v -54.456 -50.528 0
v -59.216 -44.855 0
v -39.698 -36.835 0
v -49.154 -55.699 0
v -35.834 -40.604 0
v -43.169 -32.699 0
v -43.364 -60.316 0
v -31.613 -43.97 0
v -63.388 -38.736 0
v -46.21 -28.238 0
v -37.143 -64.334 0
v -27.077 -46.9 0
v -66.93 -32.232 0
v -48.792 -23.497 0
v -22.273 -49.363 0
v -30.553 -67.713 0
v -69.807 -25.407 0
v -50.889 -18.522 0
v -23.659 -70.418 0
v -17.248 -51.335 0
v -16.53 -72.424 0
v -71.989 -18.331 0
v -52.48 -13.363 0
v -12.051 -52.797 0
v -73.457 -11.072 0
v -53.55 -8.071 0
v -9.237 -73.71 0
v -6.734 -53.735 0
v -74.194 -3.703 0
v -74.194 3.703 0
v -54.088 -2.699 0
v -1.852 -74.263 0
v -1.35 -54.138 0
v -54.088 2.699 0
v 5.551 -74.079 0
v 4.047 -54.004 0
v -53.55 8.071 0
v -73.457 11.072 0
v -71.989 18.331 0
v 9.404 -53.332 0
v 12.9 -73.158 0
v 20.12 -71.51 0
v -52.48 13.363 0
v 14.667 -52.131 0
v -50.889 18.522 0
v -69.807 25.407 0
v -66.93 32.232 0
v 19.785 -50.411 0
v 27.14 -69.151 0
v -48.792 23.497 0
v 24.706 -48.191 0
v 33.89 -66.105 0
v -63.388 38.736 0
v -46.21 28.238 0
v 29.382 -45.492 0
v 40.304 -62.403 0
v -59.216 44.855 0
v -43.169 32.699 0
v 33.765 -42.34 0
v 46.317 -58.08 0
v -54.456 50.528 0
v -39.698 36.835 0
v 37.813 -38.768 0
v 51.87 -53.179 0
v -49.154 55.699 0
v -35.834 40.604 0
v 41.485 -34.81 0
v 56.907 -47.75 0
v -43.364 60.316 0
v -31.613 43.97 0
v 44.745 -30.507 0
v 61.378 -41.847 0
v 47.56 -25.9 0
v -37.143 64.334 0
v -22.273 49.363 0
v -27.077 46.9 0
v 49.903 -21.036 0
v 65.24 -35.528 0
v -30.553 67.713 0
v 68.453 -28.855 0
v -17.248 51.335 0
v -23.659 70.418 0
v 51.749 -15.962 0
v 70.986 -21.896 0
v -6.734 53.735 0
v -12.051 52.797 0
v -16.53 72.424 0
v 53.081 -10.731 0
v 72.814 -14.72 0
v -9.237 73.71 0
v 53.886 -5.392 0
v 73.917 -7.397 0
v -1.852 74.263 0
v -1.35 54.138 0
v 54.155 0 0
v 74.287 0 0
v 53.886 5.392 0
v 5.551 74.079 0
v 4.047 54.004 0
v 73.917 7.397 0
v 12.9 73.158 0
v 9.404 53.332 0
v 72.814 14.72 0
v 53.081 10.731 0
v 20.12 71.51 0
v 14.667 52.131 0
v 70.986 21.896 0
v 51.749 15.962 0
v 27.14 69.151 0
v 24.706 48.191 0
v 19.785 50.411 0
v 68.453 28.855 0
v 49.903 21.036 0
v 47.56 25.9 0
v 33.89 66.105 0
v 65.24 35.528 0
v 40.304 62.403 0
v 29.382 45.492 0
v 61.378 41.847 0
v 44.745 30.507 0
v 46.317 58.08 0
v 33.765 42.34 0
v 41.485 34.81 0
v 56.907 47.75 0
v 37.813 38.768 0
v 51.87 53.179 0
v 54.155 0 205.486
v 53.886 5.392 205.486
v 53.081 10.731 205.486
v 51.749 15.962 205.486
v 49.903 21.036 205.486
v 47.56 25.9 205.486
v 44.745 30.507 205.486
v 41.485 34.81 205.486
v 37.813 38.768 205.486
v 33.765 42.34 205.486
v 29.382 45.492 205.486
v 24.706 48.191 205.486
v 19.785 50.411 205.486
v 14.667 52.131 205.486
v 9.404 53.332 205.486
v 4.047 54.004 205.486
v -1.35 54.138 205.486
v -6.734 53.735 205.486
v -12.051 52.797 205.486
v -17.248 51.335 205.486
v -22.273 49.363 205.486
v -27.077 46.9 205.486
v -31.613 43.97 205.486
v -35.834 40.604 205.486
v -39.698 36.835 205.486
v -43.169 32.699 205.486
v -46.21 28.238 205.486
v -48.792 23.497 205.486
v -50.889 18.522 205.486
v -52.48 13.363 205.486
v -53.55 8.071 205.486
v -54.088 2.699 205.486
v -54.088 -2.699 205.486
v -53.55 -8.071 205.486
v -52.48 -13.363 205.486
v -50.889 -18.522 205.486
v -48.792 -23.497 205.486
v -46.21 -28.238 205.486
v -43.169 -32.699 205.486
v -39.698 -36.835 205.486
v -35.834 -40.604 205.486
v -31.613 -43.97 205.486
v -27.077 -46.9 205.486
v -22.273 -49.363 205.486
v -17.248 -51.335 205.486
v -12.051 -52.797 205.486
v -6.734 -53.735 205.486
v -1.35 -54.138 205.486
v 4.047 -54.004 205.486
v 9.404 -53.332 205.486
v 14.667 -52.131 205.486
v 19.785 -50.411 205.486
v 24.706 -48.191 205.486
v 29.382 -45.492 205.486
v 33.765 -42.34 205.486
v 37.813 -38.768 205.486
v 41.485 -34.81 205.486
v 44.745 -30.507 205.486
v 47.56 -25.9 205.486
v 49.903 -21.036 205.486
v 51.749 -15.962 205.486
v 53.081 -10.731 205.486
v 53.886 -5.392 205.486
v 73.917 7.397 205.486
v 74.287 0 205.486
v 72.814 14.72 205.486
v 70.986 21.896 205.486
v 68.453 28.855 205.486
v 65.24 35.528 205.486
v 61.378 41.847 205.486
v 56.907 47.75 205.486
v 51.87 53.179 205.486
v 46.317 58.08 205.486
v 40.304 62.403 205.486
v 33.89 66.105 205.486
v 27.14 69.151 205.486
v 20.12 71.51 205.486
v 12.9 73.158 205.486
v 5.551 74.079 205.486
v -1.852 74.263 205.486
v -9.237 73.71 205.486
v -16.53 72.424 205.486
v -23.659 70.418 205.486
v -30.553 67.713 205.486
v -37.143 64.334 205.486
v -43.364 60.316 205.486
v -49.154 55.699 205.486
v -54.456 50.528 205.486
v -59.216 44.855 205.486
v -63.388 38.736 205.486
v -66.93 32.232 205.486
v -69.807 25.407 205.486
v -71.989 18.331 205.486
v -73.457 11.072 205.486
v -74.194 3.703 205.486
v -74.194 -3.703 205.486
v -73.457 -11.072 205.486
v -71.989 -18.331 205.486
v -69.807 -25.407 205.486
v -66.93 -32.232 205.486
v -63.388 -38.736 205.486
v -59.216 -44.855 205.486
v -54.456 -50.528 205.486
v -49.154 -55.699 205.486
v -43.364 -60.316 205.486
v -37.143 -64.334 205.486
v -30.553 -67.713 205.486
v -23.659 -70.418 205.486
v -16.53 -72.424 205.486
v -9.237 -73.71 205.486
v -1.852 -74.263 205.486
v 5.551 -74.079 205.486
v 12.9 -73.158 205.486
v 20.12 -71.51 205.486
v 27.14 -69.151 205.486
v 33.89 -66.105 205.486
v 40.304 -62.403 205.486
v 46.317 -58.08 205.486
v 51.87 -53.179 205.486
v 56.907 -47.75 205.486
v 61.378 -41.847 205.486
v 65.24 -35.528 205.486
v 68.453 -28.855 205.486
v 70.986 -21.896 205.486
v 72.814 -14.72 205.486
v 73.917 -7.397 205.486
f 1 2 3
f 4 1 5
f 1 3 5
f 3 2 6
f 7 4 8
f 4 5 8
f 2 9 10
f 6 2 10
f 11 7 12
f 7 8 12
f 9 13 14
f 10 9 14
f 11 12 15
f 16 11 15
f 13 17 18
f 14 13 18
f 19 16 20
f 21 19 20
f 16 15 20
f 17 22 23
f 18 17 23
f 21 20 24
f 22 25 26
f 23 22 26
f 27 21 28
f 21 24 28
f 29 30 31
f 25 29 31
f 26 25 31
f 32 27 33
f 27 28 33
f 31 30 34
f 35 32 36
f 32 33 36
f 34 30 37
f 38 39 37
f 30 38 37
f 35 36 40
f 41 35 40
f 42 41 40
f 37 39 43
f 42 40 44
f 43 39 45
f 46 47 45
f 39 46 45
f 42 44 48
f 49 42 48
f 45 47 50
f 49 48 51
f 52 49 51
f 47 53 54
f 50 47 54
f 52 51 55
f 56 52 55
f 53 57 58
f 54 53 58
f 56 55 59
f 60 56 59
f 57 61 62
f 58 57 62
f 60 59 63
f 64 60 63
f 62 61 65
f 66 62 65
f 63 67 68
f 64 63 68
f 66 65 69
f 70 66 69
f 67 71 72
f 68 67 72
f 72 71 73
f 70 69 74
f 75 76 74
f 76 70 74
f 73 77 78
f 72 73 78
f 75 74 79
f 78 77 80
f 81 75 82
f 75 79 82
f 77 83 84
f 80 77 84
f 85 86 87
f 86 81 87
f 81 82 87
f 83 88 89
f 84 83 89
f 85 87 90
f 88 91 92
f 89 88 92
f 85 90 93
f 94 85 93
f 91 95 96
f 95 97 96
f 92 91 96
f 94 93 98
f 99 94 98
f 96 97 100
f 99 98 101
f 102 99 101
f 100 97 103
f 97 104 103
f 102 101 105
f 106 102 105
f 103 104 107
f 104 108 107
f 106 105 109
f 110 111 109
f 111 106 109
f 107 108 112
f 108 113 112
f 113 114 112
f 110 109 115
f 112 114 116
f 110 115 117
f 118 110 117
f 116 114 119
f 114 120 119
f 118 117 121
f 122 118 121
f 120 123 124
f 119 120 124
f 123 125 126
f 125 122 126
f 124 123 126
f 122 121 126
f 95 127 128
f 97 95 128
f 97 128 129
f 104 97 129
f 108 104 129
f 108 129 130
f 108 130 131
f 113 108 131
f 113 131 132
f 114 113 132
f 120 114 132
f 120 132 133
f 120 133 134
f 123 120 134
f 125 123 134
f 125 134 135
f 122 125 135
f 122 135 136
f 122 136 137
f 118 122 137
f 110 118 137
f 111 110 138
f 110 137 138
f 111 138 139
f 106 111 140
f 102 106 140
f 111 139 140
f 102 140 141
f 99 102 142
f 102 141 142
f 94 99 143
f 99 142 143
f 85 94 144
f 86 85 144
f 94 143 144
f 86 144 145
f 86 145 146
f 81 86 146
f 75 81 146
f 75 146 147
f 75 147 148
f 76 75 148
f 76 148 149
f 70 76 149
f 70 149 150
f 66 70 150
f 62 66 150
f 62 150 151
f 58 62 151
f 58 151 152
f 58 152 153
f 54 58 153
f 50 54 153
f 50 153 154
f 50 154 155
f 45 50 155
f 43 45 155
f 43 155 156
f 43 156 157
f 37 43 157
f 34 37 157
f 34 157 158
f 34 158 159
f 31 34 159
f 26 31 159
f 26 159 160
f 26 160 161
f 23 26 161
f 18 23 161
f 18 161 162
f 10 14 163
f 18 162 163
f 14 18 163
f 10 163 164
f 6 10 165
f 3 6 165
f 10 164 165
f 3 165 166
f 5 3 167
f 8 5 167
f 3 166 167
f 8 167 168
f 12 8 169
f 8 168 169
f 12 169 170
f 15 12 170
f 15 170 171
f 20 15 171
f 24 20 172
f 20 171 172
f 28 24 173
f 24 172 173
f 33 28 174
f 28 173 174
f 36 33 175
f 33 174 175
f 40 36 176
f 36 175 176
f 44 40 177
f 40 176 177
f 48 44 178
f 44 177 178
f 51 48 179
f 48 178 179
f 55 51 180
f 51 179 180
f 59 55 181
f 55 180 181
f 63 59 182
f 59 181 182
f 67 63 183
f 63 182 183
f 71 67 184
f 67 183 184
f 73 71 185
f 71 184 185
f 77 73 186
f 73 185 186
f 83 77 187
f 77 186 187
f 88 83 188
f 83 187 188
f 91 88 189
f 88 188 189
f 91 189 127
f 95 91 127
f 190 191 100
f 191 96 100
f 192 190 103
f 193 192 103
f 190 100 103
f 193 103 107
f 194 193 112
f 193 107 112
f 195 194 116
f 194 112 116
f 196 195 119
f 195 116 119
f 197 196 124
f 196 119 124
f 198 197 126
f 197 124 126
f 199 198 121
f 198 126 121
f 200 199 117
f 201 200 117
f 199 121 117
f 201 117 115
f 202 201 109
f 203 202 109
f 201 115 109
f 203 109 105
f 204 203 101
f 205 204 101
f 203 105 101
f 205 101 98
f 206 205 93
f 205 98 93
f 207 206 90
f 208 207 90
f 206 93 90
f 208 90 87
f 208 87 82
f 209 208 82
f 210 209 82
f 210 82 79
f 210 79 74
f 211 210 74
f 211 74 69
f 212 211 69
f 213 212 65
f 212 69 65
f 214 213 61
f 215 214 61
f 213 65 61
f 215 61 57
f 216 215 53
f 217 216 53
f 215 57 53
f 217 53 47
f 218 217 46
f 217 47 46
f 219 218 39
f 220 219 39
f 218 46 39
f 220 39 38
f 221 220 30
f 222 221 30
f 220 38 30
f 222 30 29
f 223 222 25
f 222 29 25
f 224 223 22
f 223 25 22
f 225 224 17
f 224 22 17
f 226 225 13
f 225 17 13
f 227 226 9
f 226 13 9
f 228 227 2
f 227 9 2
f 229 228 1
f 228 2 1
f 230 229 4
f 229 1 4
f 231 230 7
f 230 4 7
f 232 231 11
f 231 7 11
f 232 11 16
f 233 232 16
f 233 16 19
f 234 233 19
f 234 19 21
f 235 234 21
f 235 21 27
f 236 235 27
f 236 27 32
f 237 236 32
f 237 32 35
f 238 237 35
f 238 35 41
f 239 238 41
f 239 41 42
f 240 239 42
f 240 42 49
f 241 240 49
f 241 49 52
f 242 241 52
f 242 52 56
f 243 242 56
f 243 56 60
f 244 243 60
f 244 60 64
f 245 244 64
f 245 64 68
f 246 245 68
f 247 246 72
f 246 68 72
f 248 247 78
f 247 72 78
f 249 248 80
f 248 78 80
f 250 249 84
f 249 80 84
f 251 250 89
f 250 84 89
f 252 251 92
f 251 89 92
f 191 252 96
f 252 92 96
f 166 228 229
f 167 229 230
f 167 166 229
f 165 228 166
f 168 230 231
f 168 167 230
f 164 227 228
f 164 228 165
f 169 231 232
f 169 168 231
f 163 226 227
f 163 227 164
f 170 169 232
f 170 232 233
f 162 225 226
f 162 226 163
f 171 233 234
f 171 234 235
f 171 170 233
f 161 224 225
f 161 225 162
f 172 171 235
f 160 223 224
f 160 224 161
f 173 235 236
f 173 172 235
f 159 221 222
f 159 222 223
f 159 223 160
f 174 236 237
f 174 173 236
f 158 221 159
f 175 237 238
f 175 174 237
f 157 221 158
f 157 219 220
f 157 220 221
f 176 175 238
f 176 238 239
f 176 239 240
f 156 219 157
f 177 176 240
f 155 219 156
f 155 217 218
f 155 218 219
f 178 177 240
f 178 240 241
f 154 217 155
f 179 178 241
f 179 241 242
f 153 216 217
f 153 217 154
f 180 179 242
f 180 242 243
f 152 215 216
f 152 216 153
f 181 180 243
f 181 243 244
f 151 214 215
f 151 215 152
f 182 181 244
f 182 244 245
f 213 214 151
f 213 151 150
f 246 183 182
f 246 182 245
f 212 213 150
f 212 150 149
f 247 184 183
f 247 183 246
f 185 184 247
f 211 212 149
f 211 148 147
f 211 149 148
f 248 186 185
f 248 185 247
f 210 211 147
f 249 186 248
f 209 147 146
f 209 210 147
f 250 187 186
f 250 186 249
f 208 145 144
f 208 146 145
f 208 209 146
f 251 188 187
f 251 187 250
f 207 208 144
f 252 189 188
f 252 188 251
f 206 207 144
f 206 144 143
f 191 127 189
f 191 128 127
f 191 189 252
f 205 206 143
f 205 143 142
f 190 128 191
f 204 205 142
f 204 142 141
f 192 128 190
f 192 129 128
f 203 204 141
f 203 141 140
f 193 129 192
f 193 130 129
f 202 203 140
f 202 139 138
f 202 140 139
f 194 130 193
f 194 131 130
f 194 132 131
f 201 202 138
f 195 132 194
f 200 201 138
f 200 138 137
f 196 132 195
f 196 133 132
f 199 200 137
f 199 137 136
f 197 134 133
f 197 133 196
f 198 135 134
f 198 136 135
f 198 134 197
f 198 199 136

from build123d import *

# Parameters (mm, degrees)
F0_R     = 74.2865291694
F1_DEPTH = 151.892
F2_DEPTH = 53.594
F3_R     = 54.1549709352
F4_DEPTH = 195.58
F5_DEPTH = 92.202


# Not quite as in the source:
# - a feature names something its author has since deleted; it is built from what else it names


with BuildPart() as f1:
    # F0 (on Top) → F1 (new body)
    with BuildSketch(Plane.XY):
        Circle(F0_R)
    extrude(amount=F1_DEPTH)

    # F2 (add): a face of the model
    f2_faces = [f1.faces().sort_by_distance(p)[0] for p in [
        (0, 0, 151.892),
    ]]
    extrude(f2_faces, amount=F2_DEPTH)

    # F3 (on face) → F4 (cut)
    with BuildSketch(Plane.XY.offset(205.486)):
        Circle(F3_R)
    extrude(amount=-F4_DEPTH, mode=Mode.SUBTRACT)

    # F5 (cut): a face of the model
    f5_faces = [f1.faces().sort_by_distance(p)[0] for p in [
        (0, 0, 9.906),
    ]]
    extrude(f5_faces, amount=-F5_DEPTH, mode=Mode.SUBTRACT)


solid = f1.part
